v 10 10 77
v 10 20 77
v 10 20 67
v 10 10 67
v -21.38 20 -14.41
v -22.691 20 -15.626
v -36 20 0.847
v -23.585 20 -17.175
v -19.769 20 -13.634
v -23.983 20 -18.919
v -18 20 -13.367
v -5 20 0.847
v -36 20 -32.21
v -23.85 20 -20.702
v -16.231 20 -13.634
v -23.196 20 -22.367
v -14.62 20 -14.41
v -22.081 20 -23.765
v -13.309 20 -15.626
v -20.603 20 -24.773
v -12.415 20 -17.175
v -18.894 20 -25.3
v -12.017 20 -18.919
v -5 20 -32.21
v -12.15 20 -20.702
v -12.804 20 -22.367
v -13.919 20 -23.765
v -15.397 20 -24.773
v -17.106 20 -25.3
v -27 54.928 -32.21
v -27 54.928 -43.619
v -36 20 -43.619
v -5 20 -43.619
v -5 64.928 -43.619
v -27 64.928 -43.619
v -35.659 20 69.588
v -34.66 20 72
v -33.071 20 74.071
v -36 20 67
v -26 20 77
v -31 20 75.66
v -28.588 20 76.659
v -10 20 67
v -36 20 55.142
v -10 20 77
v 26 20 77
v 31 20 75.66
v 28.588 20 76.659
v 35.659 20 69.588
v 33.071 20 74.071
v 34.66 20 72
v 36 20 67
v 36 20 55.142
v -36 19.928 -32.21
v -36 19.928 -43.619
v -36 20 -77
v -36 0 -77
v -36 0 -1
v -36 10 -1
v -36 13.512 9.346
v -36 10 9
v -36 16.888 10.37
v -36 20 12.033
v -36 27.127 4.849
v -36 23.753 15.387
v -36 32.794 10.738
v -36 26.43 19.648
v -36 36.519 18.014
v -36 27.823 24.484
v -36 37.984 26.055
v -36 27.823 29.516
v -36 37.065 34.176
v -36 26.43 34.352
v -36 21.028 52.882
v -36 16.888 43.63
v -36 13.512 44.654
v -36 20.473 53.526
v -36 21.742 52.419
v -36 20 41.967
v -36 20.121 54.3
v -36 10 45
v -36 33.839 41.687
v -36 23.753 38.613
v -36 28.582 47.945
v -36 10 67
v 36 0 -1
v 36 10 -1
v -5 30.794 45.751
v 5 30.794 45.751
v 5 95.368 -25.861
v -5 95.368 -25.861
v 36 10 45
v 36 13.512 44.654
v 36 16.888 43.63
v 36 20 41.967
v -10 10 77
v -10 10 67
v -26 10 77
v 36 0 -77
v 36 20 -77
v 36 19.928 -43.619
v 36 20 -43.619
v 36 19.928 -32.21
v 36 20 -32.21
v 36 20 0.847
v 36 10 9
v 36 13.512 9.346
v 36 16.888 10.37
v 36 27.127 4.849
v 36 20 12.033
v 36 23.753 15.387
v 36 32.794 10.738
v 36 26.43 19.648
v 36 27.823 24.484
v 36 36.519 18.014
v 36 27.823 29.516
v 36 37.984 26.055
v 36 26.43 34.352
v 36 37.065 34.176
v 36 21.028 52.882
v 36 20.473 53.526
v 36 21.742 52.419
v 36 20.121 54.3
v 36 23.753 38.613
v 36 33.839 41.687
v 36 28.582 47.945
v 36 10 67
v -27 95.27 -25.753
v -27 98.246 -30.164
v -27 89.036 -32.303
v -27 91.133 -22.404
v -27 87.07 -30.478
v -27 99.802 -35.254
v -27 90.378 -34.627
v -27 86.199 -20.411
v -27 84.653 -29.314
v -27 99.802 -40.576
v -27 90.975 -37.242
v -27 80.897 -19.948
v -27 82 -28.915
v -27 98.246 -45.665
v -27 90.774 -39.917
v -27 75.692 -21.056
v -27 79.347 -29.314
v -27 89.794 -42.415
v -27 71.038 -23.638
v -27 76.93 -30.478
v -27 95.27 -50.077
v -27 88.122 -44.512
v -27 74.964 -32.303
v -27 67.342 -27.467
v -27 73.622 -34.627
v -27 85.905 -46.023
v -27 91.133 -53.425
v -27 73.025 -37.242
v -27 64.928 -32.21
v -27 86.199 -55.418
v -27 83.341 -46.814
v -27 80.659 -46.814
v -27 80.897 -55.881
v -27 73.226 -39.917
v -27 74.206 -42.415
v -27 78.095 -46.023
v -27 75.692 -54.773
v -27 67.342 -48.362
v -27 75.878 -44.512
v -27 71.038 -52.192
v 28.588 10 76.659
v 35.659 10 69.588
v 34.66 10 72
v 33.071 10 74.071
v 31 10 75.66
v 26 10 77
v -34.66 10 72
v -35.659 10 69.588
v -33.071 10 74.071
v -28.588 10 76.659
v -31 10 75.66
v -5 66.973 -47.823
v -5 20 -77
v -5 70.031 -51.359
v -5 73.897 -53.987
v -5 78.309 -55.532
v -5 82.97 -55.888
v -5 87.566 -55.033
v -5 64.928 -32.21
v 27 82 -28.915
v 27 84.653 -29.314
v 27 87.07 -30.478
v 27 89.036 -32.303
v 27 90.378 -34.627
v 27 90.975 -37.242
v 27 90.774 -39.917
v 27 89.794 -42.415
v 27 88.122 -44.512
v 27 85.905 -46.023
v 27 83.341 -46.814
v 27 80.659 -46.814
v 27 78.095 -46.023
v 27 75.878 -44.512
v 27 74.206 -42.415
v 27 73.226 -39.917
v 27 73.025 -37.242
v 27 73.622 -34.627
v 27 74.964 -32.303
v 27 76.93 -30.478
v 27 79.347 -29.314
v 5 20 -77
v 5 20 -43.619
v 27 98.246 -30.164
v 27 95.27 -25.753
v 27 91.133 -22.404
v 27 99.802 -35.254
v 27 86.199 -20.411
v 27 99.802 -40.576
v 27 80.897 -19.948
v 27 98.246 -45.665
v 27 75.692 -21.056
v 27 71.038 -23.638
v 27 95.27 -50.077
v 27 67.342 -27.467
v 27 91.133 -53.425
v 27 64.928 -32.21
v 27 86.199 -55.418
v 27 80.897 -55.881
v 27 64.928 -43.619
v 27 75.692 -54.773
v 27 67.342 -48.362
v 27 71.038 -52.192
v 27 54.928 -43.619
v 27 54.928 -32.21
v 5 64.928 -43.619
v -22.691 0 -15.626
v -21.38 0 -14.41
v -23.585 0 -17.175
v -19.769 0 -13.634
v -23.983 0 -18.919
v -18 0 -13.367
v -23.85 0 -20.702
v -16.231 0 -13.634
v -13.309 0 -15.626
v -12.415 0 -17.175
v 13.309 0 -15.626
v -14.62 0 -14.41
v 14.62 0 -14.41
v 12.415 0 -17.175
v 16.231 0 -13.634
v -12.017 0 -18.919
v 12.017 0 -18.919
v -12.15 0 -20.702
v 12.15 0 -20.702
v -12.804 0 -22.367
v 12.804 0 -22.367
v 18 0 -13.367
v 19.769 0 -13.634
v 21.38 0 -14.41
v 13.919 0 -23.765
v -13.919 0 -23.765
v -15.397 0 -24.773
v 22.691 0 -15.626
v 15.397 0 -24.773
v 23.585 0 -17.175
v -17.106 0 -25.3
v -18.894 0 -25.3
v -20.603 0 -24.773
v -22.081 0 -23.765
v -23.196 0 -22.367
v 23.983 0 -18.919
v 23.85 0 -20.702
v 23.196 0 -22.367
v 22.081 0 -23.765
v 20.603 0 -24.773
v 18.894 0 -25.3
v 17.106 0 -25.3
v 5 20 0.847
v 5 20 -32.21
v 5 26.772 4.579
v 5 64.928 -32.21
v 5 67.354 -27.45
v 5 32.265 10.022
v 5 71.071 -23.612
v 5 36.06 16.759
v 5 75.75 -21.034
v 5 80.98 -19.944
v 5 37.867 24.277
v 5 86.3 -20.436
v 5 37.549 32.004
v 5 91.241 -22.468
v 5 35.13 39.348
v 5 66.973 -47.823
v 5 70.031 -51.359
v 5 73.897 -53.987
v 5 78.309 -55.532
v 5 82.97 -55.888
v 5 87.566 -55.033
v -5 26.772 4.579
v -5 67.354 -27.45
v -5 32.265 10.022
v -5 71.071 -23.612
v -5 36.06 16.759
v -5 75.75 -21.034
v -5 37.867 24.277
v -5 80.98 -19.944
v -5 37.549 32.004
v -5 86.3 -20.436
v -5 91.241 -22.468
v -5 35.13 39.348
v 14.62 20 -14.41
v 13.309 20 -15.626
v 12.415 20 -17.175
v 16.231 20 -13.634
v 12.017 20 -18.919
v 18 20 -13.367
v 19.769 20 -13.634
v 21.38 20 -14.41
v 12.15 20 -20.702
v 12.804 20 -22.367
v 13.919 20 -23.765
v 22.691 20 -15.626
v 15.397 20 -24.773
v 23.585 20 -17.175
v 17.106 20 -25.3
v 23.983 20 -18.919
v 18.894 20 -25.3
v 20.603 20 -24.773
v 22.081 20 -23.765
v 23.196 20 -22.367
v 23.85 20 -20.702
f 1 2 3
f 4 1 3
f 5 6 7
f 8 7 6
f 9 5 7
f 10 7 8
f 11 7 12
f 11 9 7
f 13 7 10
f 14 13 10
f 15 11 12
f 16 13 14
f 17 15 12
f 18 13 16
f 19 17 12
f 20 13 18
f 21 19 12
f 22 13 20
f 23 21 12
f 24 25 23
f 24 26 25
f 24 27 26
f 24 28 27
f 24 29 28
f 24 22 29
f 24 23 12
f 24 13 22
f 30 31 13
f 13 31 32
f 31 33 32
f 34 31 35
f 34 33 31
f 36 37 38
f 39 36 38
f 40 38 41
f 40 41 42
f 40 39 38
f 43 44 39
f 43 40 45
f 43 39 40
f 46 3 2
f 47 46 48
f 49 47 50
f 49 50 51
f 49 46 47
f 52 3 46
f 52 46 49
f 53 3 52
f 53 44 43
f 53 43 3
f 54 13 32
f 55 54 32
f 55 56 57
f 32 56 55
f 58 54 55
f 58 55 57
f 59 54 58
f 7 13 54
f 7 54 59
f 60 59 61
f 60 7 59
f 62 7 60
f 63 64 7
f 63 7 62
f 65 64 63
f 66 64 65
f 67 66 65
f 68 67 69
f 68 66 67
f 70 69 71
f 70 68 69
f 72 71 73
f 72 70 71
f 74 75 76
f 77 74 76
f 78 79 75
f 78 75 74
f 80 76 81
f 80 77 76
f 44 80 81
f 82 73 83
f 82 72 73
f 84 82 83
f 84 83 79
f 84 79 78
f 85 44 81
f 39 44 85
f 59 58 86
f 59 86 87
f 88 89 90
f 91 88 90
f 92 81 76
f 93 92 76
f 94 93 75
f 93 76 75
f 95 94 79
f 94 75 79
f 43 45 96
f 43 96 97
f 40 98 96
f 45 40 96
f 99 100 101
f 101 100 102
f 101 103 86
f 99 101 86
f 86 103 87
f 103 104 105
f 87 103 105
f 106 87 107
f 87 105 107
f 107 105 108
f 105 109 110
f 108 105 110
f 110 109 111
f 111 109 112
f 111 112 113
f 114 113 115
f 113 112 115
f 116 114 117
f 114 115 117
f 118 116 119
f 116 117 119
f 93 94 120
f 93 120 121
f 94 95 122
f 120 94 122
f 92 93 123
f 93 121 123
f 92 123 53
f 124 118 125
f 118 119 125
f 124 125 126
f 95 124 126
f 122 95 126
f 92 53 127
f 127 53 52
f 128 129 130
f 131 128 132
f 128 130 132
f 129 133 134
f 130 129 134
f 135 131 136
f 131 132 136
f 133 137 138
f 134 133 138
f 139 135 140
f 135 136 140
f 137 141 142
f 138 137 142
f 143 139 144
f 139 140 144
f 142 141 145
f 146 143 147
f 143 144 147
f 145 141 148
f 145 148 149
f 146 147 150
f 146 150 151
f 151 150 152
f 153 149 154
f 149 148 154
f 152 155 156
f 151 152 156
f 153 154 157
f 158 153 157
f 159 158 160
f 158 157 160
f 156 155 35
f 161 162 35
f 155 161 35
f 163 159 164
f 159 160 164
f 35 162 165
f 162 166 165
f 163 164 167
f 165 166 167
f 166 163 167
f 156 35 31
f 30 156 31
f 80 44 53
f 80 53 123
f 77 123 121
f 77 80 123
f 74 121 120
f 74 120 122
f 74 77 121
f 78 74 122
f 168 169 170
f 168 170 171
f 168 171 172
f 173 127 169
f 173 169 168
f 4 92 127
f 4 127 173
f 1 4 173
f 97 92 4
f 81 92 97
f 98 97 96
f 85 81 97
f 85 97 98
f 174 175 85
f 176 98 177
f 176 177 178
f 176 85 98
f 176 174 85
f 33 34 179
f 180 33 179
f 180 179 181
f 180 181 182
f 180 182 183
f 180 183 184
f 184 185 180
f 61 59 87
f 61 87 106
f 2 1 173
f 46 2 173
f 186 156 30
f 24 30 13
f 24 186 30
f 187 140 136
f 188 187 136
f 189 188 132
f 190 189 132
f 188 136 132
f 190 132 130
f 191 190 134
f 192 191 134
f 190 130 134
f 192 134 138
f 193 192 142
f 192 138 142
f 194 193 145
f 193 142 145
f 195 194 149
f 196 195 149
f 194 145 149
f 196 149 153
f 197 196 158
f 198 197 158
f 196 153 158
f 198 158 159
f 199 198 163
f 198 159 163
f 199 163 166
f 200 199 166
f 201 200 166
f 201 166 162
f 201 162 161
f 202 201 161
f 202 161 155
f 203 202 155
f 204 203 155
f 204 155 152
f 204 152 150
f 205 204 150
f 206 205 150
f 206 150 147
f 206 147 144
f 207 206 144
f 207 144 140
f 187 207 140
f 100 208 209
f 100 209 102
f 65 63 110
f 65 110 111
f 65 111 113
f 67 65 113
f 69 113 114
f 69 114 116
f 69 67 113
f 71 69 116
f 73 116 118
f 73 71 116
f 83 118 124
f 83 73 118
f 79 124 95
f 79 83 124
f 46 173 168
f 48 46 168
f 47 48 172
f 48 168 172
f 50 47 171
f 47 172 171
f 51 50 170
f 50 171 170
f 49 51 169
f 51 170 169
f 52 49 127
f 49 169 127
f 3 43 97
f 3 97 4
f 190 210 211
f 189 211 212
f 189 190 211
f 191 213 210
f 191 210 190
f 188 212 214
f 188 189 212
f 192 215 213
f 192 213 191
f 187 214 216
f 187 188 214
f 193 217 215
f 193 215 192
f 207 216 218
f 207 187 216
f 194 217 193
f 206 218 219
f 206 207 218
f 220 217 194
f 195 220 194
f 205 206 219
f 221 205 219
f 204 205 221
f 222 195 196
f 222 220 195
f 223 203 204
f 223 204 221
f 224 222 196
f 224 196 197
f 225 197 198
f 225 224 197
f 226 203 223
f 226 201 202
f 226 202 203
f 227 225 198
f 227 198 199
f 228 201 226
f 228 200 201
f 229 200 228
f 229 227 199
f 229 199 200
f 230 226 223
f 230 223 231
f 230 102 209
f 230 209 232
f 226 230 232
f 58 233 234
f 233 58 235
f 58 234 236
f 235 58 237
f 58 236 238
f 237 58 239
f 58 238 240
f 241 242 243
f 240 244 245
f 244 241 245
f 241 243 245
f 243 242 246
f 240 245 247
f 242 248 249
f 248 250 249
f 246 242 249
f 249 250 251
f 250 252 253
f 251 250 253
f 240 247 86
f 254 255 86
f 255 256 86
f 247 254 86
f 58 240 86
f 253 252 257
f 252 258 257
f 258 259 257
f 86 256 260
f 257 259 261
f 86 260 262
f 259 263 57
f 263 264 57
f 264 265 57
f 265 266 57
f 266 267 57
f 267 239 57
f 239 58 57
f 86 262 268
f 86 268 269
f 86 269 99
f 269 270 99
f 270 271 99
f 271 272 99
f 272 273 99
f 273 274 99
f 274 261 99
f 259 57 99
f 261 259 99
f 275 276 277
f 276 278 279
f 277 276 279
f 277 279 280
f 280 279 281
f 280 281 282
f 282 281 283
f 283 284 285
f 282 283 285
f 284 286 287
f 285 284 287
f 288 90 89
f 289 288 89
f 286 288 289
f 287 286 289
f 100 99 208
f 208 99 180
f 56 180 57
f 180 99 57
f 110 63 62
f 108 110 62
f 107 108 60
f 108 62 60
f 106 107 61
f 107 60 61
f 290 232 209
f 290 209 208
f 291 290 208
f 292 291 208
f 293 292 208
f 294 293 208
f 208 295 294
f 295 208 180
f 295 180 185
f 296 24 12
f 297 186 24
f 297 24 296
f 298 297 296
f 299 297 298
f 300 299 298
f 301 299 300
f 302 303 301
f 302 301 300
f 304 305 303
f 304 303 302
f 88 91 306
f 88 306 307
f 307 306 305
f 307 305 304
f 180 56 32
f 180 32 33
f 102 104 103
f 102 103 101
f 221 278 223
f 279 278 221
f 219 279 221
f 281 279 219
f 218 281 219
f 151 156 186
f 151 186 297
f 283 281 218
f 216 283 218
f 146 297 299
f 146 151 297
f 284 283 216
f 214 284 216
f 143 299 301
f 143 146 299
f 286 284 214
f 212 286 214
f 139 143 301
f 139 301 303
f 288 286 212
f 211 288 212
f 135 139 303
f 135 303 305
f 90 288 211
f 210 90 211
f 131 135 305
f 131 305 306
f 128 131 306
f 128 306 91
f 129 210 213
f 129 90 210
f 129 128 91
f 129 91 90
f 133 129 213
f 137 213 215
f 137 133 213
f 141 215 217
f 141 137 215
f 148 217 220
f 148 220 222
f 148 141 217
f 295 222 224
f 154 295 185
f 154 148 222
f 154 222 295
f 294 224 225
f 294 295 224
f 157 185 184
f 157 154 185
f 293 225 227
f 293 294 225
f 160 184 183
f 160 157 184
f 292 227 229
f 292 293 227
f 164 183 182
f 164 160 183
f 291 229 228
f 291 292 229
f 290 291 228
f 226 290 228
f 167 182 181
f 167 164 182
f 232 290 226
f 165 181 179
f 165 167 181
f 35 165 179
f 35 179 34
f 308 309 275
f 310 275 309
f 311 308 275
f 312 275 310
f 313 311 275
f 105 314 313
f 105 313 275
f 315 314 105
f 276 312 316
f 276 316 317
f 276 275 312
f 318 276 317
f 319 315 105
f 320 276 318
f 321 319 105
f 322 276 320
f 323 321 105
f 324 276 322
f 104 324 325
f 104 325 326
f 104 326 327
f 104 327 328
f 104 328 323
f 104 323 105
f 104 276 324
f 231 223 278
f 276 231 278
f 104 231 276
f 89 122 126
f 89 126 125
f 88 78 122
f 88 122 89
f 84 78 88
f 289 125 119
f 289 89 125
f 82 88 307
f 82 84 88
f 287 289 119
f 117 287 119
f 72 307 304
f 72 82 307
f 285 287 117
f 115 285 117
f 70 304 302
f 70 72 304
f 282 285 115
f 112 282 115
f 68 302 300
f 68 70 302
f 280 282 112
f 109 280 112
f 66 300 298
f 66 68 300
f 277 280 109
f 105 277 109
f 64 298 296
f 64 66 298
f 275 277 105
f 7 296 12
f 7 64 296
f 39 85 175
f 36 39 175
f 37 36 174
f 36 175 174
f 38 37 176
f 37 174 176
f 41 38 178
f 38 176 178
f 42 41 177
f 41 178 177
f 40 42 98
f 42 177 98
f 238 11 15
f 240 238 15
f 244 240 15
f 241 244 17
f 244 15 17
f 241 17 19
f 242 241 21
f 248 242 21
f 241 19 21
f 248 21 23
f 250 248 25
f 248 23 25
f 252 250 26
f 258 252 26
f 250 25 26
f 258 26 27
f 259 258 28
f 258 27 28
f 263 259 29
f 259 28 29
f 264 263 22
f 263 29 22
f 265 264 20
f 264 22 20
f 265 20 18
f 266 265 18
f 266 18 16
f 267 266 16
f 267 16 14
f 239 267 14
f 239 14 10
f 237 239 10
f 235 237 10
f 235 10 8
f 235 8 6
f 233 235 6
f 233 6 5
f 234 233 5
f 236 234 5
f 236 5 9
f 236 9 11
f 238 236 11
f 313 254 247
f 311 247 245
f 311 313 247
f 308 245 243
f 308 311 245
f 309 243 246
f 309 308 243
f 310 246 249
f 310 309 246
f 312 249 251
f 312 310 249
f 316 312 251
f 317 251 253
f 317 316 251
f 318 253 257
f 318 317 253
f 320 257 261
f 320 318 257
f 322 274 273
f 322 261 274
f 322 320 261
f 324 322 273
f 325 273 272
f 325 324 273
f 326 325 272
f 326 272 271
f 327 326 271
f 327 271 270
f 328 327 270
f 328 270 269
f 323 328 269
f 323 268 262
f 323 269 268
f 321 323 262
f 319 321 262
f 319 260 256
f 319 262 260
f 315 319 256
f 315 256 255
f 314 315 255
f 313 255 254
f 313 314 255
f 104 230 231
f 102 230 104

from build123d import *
from build123d.topology import SkipClean

# Parameters (mm, degrees)
BOSS_EXTRUDE1_DEPTH      = 20
SKETCH3_W                = 78
SKETCH3_H                = 10
CUT_EXTRUDE1_DEPTH       = 108.29864864
SKETCH5_W                = 20
SKETCH5_H                = 10
CUT_EXTRUDE2_DEPTH       = 88.321245983
BOSS_EXTRUDE3_DEPTH      = 72
SKETCH10_R               = 18
CUT_EXTRUDE4_DEPTH       = 113.058020686
SKETCH11_R               = 6
CUT_EXTRUDE5_DEPTH       = 88.321245983
SKETCH14_R               = 18
SKETCH14_R_2             = 9
BOSS_EXTRUDE4_DEPTH      = 72
SKETCH19_R               = 18
CUT_EXTRUDE6_DEPTH       = 9
BOSS_EXTRUDE5_DEPTH      = 9
BOSS_EXTRUDE5_DEPTH_BACK = 63
CUT_EXTRUDE8_DEPTH       = 42.619271
BOSS_EXTRUDE6_DEPTH      = 5
BOSS_EXTRUDE7_DEPTH      = 5


with BuildPart() as part:
    # Sketch1 → Boss-Extrude1 (new body)
    with BuildSketch(Plane(origin=(0, 0, 0), x_dir=(1, 0, 0), z_dir=(0, 1, 0))):
        with BuildLine():
            Line((-26, -77), (26, -77))
            ThreePointArc((26, -77), (33.071067812, -74.071067812), (36, -67))
            Line((36, -67), (36, 77))
            Line((36, 77), (-36, 77))
            Line((-36, 77), (-36, -67))
            ThreePointArc((-36, -67), (-33.071067812, -74.071067812), (-26, -77))
        make_face()
    extrude(amount=BOSS_EXTRUDE1_DEPTH)

    # Sketch3 → Cut-Extrude1 (cut, through all)
    with BuildSketch(Plane.ZY.offset(36)):
        with Locations((38, 5)):
            Rectangle(SKETCH3_W, SKETCH3_H)
    extrude(amount=-CUT_EXTRUDE1_DEPTH, mode=Mode.SUBTRACT)

    # Sketch5 → Cut-Extrude2 (cut, through all)
    with BuildSketch(Plane(origin=(0, 20, 0), x_dir=(1, 0, 0), z_dir=(0, 1, 0))):
        with Locations((0, -72)):
            Rectangle(SKETCH5_W, SKETCH5_H)
    extrude(amount=-CUT_EXTRUDE2_DEPTH, mode=Mode.SUBTRACT)

    # Sketch9 → Boss-Extrude3 (add, through all)
    with BuildSketch(Plane.ZY.offset(36)):
        with BuildLine():
            ThreePointArc((52.419027344, 21.741935484), (26.054797228, 37.984041733), (0.846606339, 20))
            Line((0.846606339, 20), (12.033370453, 20))
            ThreePointArc((12.033370453, 20), (27, 28), (41.966629547, 20))
            Line((41.966629547, 20), (53.153393661, 20))
            Line((53.153393661, 20), (55.142494559, 20))
            ThreePointArc((55.142494559, 20), (53.526046841, 20.472729382), (52.419027344, 21.741935484))
        make_face()
        with BuildLine():
            ThreePointArc((41.966629547, 20), (44.22497216, 15.22497216), (45, 10))
            Line((45, 10), (55, 10))
            ThreePointArc((55, 10), (54.534478591, 15.08453427), (53.153393661, 20))
            Line((53.153393661, 20), (41.966629547, 20))
        make_face()
        with BuildLine():
            ThreePointArc((0.846606339, 20), (-0.534478591, 15.08453427), (-1, 10))
            Line((-1, 10), (9, 10))
            ThreePointArc((9, 10), (9.77502784, 15.22497216), (12.033370453, 20))
            Line((12.033370453, 20), (0.846606339, 20))
        make_face()
    extrude(amount=-BOSS_EXTRUDE3_DEPTH)

    # Sketch10 → Cut-Extrude4 (cut, through all)
    with SkipClean():  # the faces are left unmerged after this step: merging them gives an invalid solid
        with BuildSketch(Plane.ZY.offset(36)):
            with Locations((27, 10)):
                Circle(SKETCH10_R)
        extrude(amount=-CUT_EXTRUDE4_DEPTH, mode=Mode.SUBTRACT)

    # Sketch11 → Cut-Extrude5 (cut, through all)
    with SkipClean():  # the faces are left unmerged after this step: merging them gives an invalid solid
        with BuildSketch(Plane(origin=(0, 20, 0), x_dir=(1, 0, 0), z_dir=(0, 1, 0))):
            with Locations(Location((-18, 19.367183159, 0), (0, 0, 270))):
                Circle(SKETCH11_R)
        cut_extrude5 = extrude(amount=-CUT_EXTRUDE5_DEPTH, mode=Mode.SUBTRACT)

    # Mirror1: Cut-Extrude5 across plane
    with SkipClean():  # the faces are left unmerged after this step: merging them gives an invalid solid
        add(cut_extrude5.mirror(Plane(origin=(0, 0, 0), x_dir=(0, 0, 1), z_dir=(1, 0, 0))), mode=Mode.SUBTRACT)



with BuildPart() as body_2:
    # Sketch14 → Boss-Extrude4 (new, through all)
    with BuildSketch(Plane.ZY.offset(36)):
        with Locations((-37.91461026, 82)):
            Circle(SKETCH14_R)
        with Locations((-37.91461026, 82)):
            Circle(SKETCH14_R_2, mode=Mode.SUBTRACT)
    extrude(amount=-BOSS_EXTRUDE4_DEPTH)

    # Sketch19 → Cut-Extrude6 (cut)
    with BuildSketch(Plane.ZY.offset(36)):
        with Locations((-37.91461026, 82)):
            Circle(SKETCH19_R)
    cut_extrude6 = extrude(amount=-CUT_EXTRUDE6_DEPTH, mode=Mode.SUBTRACT)

    # Mirror2: Cut-Extrude6 across plane
    add(cut_extrude6.mirror(Plane(origin=(0, 0, 0), x_dir=(0, 0, 1), z_dir=(1, 0, 0))), mode=Mode.SUBTRACT)

    # Sketch21 → Boss-Extrude5 (add, two sides: drawn at the far end of the back side and taken through both)
    with BuildSketch(Plane.ZY.offset(27).offset(-BOSS_EXTRUDE5_DEPTH_BACK)):
        with BuildLine():
            Line((-32.209949075, 19.927892902), (-43.619271445, 19.927892902))
            Line((-43.619271445, 19.927892902), (-43.619271445, 64.927892902))
            ThreePointArc((-43.619271445, 64.927892902), (-37.91461026, 64), (-32.209949075, 64.927892902))
            Line((-32.209949075, 64.927892902), (-32.209949075, 19.927892902))
        make_face()
    extrude(amount=BOSS_EXTRUDE5_DEPTH + BOSS_EXTRUDE5_DEPTH_BACK)

    # Sketch24 → Cut-Extrude8 (cut)
    with BuildSketch(Plane(origin=(0, 0, -43.619271445), x_dir=(-1, 0, 0), z_dir=(0, 0, -1))):
        Polygon((-27, 64.927892902), (-27, 54.927892902), (-36, 20), (-36, 64.927892902), align=None)
        Polygon((27, 64.927892902), (27, 54.927892902), (36, 20), (36, 64.927892902), align=None)
    extrude(amount=-CUT_EXTRUDE8_DEPTH, mode=Mode.SUBTRACT)


with BuildPart() as part_1:
    with SkipClean():  # the faces are left unmerged after this step: merging them gives an invalid solid
        add(part.part)

        add(body_2.part)  # Boss-Extrude6 merges body 2
        # Sketch30 → Boss-Extrude6 (add, symmetric)
        with BuildSketch(Plane(origin=(0, 0, 0), x_dir=(0, 0, -1), z_dir=(1, 0, 0))):
            with BuildLine():
                Line((-45.750774329, 30.794433439), (25.860541049, 95.367850068))
                ThreePointArc((25.860541049, 95.367850068), (20.293859016, 78.324523758), (32.209949075, 64.927892902))
                Line((32.209949075, 64.927892902), (32.209949075, 20))
                Line((32.209949075, 20), (-0.846606339, 20))
                ThreePointArc((-0.846606339, 20), (-20.455564076, 37.224444135), (-45.750774329, 30.794433439))
            make_face()
        extrude(amount=BOSS_EXTRUDE6_DEPTH, both=True)

    # Sketch31 → Boss-Extrude7 (add, symmetric)
    with SkipClean():  # the faces are left unmerged after this step: merging them gives an invalid solid
        with BuildSketch(Plane(origin=(0, 0, 0), x_dir=(0, 0, -1), z_dir=(1, 0, 0))):
            with BuildLine():
                Line((43.619271445, 64.927892902), (43.619271445, 20))
                Line((43.619271445, 20), (77, 20))
                Line((77, 20), (55.032581189, 87.565525247))
                ThreePointArc((55.032581189, 87.565525247), (53.987373983, 73.896527516), (43.619271445, 64.927892902))
            make_face()
        extrude(amount=BOSS_EXTRUDE7_DEPTH, both=True)


solid = part_1.part
